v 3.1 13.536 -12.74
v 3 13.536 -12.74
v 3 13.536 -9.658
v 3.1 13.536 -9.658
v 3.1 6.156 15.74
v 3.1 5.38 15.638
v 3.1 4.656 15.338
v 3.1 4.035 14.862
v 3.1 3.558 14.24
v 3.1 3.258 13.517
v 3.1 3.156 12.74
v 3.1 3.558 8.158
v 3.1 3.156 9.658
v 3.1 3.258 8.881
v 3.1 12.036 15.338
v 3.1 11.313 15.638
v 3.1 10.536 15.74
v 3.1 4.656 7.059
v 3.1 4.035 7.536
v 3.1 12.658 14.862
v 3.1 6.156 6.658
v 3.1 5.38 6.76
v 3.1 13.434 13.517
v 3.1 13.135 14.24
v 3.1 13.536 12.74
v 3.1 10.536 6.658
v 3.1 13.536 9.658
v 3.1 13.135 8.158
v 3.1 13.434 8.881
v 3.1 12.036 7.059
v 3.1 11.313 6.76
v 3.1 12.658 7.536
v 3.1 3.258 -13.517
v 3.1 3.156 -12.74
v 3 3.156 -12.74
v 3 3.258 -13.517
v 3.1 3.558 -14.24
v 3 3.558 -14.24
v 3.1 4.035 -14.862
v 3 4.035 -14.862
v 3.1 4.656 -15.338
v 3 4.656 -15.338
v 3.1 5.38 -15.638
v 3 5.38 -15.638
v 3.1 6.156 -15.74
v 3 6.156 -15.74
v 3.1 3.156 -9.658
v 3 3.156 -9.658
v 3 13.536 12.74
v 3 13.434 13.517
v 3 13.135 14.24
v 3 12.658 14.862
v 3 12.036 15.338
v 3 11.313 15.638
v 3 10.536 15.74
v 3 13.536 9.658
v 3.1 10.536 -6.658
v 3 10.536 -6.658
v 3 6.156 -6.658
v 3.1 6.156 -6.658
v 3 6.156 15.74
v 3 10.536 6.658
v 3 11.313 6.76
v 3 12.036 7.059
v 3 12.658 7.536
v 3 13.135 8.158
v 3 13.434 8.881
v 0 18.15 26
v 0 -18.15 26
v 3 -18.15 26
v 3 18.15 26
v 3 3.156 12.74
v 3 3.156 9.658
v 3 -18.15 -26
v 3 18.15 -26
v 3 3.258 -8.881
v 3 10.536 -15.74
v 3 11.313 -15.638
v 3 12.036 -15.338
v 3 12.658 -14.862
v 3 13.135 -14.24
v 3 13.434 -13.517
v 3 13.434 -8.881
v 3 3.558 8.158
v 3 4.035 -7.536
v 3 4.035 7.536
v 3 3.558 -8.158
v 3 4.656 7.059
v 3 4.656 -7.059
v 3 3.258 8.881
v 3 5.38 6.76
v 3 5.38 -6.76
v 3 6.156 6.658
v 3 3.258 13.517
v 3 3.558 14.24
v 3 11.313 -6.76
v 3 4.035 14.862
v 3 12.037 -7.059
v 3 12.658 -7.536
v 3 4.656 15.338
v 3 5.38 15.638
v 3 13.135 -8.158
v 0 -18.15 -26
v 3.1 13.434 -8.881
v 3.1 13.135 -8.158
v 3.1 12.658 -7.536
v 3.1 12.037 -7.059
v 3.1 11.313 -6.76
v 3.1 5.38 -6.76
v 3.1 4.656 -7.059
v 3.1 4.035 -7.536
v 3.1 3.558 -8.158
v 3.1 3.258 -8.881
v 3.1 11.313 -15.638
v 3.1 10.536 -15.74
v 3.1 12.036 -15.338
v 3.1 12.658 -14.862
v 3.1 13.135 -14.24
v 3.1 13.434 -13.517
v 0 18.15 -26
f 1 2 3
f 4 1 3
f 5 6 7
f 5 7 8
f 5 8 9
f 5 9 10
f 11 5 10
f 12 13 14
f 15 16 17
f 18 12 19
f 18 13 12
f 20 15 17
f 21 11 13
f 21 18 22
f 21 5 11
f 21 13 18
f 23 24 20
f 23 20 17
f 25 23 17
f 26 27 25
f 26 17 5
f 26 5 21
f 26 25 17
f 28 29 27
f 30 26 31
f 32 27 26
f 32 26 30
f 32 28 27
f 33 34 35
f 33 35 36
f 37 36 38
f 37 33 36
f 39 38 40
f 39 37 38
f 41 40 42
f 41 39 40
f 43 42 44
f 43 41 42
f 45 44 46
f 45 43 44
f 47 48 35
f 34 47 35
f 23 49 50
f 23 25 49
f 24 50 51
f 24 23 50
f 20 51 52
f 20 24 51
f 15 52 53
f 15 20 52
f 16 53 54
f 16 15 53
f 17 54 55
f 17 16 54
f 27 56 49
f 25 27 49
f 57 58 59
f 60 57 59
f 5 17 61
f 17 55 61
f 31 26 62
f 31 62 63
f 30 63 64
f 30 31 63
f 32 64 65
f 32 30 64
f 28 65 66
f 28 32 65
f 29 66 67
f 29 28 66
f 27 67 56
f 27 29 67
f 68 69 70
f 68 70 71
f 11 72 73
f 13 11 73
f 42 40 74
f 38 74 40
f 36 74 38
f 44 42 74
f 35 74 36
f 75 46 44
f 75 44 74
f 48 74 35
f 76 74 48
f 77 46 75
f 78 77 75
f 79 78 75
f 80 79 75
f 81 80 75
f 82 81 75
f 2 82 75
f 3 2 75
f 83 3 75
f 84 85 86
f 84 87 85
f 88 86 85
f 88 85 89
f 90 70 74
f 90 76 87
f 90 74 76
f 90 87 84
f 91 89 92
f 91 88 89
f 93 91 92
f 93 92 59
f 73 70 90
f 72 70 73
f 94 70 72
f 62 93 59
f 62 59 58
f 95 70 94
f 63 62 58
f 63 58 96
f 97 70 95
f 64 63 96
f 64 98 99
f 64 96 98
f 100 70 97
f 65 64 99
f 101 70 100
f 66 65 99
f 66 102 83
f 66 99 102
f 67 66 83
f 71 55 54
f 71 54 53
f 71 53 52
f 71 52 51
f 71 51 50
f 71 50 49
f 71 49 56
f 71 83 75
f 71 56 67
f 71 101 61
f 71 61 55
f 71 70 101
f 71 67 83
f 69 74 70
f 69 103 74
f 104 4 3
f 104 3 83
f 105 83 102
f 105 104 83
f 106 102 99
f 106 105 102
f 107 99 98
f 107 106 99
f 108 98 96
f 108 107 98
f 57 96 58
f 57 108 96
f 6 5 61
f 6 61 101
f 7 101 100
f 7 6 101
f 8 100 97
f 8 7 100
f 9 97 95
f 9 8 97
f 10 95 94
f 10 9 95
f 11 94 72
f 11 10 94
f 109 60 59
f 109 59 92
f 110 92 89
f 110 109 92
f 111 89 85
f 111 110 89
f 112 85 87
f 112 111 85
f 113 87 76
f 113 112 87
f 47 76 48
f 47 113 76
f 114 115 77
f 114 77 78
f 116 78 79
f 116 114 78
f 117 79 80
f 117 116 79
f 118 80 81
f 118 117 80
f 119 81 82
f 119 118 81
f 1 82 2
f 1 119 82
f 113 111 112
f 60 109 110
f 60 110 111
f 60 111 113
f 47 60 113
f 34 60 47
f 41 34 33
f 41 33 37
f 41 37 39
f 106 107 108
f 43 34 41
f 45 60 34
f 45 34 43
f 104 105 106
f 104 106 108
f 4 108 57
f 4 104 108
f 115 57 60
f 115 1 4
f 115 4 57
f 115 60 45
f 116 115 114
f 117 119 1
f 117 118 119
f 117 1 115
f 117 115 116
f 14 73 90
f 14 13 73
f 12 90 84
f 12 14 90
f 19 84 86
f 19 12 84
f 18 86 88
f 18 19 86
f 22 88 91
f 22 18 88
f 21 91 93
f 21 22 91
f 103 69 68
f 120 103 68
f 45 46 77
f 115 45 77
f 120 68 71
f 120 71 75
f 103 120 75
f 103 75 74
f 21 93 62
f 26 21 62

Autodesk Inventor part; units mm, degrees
ref_plane "YZ Plane" through (0, 0, 0) normal (1, 0, 0) x (0, 1, 0)
ref_plane "XZ Plane" through (0, 0, 0) normal (0, 1, 0) x (-1, 0, 0)
ref_plane "XY Plane" through (0, 0, 0) normal (0, 0, 1) x (1, 0, 0)
sketch "Boceto1" plane through (0, 0, 0) normal (1, 0, 0) x (0, 1, 0)
  line L0 (-18.15, 26) -> (18.15, 26)
  line L1 (18.15, 26) -> (18.15, -26)
  line L2 (18.15, -26) -> (-18.15, -26)
  line L3 (-18.15, -26) -> (-18.15, 26)
  line L4 (-18.15, 26) -> (18.15, -26) construction
  line L5 (18.15, 26) -> (-18.15, -26) construction
  point P0 (0, 0)
  dimension "d0" = 36.3
  dimension "d1" = 52
extrude "Extrusión1" add sketch "Boceto1" along normal blind 3
sketch "Boceto2" plane through (3, 0, 0) normal (1, 0, 0) x (0, 0, -1)
  line L0 (-15.7403, 3.1561) -> (-6.6575, 3.1561)
  line L1 (-6.6575, 3.1561) -> (-6.6575, 13.5365)
  line L2 (-6.6575, 13.5365) -> (-15.7403, 13.5365)
  line L3 (-15.7403, 13.5365) -> (-15.7403, 3.1561)
  line L4 (-15.7403, 3.1561) -> (-6.6575, 13.5365) construction
  line L5 (-6.6575, 3.1561) -> (-15.7403, 13.5365) construction
  point P0 (0, 0)
  point P1 (-11.1989, 8.3463)
extrude "Extrusión2" add sketch "Boceto2" along normal blind 0.1
fillet "Empalme1" radius 3 4 edges at (3.05, 13.5365, 15.7403) (3.05, 13.5365, 6.6575) (3.05, 3.1561, 15.7403) (3.05, 3.1561, 6.6575)
mirror "Simetría1" about plane through (0, 0, 0) normal (0, 0, 1) of "Extrusión2", "Empalme1"
properties part number "pantalla"
